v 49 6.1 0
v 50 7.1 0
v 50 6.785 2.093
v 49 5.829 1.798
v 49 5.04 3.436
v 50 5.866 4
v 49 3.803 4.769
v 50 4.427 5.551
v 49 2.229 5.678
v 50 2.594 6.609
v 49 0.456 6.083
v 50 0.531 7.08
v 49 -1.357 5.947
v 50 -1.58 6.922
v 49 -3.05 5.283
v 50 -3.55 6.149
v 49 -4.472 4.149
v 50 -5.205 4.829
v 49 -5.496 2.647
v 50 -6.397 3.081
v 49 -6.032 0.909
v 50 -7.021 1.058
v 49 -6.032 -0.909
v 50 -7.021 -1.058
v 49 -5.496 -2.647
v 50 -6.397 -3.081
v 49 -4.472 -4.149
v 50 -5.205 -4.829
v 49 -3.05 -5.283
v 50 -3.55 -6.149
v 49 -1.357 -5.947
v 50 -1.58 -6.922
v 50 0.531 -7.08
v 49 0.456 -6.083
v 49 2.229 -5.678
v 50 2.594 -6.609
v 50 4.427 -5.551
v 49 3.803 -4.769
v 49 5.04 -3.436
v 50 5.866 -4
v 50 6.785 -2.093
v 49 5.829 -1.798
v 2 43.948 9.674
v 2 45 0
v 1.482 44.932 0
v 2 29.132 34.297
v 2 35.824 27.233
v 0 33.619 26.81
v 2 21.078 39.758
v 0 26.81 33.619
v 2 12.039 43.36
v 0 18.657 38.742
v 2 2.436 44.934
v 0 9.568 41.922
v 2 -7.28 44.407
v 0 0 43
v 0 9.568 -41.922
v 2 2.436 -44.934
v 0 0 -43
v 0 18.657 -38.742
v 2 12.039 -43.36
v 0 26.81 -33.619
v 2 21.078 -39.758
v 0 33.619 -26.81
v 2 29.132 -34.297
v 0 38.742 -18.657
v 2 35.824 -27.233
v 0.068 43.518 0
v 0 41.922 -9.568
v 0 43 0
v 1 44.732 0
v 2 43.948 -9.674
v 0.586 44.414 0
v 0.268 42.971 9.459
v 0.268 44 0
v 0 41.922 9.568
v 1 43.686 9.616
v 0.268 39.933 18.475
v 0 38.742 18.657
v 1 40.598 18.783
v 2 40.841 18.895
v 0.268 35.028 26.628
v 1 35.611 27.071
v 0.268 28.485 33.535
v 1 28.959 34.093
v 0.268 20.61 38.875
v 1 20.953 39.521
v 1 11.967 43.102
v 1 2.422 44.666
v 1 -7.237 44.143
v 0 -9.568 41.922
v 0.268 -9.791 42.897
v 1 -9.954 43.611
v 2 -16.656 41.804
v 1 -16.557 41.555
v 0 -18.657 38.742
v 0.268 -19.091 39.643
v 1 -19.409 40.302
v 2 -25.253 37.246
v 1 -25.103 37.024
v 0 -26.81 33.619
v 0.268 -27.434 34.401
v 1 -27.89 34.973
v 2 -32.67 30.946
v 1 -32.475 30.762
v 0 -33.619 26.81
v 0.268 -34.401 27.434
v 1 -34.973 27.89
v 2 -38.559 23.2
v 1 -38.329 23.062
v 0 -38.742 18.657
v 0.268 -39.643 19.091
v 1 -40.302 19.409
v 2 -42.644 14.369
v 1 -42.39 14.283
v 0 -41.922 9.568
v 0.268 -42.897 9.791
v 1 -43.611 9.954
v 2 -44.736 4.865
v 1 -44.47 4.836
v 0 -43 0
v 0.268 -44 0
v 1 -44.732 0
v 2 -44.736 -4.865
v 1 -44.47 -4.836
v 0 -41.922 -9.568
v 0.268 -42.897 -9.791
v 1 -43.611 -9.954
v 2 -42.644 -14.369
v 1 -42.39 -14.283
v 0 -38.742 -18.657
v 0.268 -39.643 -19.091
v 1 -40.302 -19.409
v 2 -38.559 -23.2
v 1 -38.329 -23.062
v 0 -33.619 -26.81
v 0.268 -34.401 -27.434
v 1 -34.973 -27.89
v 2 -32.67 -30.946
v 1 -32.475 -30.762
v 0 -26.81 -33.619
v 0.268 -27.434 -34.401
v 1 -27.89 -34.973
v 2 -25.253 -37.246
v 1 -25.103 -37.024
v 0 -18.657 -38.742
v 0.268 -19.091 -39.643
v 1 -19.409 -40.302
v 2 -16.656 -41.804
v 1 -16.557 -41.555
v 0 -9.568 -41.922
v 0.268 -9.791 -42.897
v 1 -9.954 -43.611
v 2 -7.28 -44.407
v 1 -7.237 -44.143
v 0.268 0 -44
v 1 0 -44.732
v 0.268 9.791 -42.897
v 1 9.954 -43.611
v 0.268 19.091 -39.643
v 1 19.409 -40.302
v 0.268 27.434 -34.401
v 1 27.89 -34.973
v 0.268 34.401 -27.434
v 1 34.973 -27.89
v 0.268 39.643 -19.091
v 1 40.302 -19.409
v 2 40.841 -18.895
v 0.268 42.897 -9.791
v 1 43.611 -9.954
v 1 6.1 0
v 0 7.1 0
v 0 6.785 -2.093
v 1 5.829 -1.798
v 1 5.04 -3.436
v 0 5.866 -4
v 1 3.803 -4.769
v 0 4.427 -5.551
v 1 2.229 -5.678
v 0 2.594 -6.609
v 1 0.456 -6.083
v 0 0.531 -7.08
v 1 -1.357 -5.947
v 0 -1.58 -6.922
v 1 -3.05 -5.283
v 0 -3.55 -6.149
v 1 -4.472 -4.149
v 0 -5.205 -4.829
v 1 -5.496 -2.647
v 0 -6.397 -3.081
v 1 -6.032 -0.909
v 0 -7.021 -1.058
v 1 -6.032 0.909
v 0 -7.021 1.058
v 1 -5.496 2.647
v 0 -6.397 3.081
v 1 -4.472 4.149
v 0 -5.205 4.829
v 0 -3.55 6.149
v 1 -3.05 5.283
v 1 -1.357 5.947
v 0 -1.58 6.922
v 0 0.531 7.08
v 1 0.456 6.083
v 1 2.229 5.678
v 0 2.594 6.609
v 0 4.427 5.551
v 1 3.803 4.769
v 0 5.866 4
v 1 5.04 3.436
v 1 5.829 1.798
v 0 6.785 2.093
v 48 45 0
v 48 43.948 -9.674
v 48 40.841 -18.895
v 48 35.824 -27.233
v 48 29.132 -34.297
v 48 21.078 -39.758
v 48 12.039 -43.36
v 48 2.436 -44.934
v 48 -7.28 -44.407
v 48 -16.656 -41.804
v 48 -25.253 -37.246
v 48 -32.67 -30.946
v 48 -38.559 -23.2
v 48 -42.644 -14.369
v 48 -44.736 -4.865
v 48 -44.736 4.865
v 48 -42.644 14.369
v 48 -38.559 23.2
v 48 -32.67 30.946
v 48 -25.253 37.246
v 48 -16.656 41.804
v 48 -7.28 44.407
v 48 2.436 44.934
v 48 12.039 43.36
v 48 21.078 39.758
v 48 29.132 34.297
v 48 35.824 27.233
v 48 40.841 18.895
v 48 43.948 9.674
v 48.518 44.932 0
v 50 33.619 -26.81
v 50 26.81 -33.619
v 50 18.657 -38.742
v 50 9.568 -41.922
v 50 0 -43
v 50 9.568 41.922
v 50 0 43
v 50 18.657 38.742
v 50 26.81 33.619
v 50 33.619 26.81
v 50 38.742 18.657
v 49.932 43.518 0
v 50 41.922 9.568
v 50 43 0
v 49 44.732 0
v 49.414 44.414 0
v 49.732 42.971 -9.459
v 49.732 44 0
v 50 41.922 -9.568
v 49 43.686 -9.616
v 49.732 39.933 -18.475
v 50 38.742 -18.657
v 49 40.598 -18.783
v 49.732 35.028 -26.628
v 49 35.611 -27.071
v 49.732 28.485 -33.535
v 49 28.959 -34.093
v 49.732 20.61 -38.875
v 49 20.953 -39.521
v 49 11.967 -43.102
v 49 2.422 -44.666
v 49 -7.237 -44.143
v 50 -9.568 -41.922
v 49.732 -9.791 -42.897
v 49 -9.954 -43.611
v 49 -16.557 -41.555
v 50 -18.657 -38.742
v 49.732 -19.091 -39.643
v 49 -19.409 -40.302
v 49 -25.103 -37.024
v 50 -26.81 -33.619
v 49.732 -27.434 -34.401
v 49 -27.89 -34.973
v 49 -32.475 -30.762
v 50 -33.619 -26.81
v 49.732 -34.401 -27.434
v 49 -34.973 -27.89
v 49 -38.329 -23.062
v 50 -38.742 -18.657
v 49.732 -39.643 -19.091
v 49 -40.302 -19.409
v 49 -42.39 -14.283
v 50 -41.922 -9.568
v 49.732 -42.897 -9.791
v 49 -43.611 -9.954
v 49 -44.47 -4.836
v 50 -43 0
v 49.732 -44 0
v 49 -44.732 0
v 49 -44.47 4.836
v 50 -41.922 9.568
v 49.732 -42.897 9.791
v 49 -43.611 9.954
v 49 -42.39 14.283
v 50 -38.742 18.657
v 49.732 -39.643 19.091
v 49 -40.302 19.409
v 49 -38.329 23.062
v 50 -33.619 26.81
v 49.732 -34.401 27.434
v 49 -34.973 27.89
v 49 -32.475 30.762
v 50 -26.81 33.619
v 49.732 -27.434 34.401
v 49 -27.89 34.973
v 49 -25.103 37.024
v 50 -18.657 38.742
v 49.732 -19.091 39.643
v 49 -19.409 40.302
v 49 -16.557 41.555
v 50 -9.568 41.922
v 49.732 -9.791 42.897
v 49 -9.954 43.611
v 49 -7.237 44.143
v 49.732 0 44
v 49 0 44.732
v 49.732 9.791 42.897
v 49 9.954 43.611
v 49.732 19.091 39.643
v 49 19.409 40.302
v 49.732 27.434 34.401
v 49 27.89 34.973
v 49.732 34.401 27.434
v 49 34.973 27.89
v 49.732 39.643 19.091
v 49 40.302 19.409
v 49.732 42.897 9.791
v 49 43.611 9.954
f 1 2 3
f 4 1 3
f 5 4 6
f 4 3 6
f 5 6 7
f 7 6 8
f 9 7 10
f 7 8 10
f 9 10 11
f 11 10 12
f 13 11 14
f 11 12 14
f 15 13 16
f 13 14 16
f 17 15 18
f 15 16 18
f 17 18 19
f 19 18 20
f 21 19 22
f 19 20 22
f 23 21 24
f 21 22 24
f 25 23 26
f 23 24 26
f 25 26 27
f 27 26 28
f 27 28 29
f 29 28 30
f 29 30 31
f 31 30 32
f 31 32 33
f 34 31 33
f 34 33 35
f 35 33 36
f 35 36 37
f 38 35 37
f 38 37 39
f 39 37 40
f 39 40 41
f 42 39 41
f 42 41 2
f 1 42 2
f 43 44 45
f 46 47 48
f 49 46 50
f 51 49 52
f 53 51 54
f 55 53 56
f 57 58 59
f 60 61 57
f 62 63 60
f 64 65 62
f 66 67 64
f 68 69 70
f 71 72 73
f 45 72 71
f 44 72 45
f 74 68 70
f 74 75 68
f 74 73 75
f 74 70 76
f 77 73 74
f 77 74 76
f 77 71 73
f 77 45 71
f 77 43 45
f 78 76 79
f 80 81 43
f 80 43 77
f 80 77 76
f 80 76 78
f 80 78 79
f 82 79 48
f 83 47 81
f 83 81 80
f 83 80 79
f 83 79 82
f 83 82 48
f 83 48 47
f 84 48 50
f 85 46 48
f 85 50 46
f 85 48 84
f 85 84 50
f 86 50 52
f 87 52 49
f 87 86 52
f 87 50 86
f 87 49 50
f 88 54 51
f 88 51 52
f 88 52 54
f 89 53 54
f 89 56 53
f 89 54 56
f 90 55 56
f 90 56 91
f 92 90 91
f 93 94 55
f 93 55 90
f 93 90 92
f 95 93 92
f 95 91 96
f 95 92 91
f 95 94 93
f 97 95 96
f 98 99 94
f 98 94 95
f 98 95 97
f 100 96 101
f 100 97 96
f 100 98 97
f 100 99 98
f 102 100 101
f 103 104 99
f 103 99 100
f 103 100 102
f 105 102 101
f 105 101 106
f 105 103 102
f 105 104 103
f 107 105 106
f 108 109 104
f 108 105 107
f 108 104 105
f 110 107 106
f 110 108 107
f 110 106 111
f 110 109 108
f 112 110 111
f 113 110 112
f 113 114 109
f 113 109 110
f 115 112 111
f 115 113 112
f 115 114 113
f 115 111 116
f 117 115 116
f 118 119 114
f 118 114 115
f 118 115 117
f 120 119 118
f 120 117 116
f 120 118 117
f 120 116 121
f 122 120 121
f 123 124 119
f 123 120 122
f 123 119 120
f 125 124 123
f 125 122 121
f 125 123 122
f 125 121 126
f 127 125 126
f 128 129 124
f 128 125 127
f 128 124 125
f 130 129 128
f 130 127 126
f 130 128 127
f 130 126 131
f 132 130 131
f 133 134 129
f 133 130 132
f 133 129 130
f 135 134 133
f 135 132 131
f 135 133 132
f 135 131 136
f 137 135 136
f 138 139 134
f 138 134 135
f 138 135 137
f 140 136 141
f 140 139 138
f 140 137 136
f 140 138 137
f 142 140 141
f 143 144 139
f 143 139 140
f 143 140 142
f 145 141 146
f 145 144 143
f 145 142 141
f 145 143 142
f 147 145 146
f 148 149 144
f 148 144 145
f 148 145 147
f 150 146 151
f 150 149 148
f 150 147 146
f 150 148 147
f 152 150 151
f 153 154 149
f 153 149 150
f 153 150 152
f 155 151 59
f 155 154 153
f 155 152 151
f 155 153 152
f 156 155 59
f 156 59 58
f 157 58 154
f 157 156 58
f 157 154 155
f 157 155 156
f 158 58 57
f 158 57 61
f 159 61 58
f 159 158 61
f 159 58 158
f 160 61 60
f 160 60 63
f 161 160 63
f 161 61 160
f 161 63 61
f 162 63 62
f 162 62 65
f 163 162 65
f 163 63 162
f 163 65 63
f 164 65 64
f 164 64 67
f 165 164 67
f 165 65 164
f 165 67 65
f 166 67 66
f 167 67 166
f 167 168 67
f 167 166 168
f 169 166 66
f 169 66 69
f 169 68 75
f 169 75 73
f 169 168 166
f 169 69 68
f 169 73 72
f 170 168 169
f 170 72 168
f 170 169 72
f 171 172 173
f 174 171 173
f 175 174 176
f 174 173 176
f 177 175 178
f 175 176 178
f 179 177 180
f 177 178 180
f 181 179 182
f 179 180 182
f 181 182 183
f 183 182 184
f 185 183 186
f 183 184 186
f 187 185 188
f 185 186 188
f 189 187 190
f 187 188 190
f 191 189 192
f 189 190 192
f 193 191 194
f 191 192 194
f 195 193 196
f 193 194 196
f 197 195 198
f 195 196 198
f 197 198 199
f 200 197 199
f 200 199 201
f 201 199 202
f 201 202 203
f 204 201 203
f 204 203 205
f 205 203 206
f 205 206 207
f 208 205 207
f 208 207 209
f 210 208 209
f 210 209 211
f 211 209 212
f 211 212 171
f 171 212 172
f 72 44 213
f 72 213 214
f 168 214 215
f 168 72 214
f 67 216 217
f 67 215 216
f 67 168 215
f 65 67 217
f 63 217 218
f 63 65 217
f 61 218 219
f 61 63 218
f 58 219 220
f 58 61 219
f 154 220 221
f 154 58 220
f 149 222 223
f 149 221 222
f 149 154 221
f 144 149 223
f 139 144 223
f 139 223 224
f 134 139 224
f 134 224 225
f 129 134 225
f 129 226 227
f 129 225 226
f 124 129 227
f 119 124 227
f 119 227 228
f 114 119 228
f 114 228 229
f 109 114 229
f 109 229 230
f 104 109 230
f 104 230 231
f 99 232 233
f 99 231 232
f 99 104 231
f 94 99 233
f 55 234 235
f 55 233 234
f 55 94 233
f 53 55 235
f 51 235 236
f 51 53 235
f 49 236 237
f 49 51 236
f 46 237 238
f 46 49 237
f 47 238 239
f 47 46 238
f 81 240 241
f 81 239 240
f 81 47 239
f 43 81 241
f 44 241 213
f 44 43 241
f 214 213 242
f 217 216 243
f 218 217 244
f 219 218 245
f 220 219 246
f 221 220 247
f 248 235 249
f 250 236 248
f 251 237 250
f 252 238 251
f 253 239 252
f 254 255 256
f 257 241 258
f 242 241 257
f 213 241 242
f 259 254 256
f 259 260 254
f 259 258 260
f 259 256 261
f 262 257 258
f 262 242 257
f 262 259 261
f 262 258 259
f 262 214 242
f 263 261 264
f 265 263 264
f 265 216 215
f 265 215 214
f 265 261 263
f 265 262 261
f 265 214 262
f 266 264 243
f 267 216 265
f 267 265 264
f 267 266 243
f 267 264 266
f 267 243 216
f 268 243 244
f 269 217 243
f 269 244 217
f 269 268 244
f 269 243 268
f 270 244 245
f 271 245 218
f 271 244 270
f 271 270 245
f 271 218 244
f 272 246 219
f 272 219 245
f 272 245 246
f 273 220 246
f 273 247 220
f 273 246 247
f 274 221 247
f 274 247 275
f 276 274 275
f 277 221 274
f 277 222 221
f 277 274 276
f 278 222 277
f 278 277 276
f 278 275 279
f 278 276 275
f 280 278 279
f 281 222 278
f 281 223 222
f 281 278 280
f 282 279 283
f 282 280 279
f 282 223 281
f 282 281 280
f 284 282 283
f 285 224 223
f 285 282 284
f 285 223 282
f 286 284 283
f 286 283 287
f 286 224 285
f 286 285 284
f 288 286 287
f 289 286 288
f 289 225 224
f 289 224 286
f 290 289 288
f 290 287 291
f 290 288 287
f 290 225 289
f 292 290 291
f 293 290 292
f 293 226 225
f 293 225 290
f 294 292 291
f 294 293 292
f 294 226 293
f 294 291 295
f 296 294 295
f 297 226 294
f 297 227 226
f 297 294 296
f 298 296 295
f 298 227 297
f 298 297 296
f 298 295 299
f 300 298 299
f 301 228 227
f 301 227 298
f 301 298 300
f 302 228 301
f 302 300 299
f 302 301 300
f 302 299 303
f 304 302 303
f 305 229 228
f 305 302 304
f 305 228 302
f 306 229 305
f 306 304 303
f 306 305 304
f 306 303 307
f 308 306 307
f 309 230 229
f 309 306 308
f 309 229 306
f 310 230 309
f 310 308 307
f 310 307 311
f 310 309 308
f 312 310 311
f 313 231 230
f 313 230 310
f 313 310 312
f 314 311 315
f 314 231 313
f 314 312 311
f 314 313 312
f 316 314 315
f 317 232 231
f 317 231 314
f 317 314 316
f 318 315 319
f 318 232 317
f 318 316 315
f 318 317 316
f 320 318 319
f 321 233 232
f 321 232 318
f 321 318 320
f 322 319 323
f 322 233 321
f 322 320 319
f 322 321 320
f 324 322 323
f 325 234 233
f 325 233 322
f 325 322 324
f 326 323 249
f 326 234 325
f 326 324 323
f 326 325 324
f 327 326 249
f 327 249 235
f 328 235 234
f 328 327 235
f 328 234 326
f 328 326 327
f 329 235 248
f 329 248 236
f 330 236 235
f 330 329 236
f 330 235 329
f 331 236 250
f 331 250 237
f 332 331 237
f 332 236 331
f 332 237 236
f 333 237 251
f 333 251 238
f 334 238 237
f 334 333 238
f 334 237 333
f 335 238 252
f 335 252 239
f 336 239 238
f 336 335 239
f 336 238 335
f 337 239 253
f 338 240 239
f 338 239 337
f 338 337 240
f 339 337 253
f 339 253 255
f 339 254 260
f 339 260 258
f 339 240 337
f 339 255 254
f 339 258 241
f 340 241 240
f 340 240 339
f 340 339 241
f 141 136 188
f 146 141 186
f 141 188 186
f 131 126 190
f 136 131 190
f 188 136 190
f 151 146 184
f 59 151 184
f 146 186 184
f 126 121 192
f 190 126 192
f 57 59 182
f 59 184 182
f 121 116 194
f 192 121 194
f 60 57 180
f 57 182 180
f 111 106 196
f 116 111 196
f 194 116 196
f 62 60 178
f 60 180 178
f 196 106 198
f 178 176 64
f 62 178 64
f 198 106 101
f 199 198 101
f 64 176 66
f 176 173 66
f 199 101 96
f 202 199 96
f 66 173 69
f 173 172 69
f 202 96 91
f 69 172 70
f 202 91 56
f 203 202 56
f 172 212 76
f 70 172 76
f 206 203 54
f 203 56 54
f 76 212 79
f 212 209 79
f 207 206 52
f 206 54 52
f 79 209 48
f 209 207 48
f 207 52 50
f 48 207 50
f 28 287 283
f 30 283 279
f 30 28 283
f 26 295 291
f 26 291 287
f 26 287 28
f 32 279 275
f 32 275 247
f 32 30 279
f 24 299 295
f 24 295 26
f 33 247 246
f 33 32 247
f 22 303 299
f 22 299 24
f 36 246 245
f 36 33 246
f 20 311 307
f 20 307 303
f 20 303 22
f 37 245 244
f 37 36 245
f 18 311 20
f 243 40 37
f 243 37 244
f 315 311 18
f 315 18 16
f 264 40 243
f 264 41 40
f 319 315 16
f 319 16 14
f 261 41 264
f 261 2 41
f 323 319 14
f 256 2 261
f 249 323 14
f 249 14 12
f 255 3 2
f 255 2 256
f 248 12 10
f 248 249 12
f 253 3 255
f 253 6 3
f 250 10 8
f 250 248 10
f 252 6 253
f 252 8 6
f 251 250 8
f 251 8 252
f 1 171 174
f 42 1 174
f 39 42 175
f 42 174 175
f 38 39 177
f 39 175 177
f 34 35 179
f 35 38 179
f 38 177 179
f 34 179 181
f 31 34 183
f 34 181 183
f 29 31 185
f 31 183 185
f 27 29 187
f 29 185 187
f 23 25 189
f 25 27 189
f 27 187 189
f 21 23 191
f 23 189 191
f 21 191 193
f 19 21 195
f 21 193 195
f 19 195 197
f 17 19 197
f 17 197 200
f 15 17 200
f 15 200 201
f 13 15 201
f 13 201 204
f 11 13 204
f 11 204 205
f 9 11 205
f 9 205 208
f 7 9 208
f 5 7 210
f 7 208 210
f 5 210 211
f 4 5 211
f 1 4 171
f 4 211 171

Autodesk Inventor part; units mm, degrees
ref_plane "YZ Plane" through (0, 0, 0) normal (1, 0, 0) x (0, 1, 0)
ref_plane "XZ Plane" through (0, 0, 0) normal (0, 1, 0) x (-1, 0, 0)
ref_plane "XY Plane" through (0, 0, 0) normal (0, 0, 1) x (1, 0, 0)
sketch "Sketch1" plane through (0, 0, 0) normal (1, 0, 0) x (0, 1, 0)
  circle A0 centre (0, 0) radius 45
  circle A1 centre (0, 0) radius 6.1
  dimension "d0" = 90
  dimension "d1" = 12.2
extrude "Extrusion1" add sketch "Sketch1" along normal blind 50
chamfer "Chamfer1" distance 1 angle 45 2 edges at (50, -6.1, 0) (0, -6.1, 0)
fillet "Fillet1" radius 2 2 edges at (0, -45, 0) (50, -45, 0)
properties part number "ciezarek" material "Iron, Cast"
